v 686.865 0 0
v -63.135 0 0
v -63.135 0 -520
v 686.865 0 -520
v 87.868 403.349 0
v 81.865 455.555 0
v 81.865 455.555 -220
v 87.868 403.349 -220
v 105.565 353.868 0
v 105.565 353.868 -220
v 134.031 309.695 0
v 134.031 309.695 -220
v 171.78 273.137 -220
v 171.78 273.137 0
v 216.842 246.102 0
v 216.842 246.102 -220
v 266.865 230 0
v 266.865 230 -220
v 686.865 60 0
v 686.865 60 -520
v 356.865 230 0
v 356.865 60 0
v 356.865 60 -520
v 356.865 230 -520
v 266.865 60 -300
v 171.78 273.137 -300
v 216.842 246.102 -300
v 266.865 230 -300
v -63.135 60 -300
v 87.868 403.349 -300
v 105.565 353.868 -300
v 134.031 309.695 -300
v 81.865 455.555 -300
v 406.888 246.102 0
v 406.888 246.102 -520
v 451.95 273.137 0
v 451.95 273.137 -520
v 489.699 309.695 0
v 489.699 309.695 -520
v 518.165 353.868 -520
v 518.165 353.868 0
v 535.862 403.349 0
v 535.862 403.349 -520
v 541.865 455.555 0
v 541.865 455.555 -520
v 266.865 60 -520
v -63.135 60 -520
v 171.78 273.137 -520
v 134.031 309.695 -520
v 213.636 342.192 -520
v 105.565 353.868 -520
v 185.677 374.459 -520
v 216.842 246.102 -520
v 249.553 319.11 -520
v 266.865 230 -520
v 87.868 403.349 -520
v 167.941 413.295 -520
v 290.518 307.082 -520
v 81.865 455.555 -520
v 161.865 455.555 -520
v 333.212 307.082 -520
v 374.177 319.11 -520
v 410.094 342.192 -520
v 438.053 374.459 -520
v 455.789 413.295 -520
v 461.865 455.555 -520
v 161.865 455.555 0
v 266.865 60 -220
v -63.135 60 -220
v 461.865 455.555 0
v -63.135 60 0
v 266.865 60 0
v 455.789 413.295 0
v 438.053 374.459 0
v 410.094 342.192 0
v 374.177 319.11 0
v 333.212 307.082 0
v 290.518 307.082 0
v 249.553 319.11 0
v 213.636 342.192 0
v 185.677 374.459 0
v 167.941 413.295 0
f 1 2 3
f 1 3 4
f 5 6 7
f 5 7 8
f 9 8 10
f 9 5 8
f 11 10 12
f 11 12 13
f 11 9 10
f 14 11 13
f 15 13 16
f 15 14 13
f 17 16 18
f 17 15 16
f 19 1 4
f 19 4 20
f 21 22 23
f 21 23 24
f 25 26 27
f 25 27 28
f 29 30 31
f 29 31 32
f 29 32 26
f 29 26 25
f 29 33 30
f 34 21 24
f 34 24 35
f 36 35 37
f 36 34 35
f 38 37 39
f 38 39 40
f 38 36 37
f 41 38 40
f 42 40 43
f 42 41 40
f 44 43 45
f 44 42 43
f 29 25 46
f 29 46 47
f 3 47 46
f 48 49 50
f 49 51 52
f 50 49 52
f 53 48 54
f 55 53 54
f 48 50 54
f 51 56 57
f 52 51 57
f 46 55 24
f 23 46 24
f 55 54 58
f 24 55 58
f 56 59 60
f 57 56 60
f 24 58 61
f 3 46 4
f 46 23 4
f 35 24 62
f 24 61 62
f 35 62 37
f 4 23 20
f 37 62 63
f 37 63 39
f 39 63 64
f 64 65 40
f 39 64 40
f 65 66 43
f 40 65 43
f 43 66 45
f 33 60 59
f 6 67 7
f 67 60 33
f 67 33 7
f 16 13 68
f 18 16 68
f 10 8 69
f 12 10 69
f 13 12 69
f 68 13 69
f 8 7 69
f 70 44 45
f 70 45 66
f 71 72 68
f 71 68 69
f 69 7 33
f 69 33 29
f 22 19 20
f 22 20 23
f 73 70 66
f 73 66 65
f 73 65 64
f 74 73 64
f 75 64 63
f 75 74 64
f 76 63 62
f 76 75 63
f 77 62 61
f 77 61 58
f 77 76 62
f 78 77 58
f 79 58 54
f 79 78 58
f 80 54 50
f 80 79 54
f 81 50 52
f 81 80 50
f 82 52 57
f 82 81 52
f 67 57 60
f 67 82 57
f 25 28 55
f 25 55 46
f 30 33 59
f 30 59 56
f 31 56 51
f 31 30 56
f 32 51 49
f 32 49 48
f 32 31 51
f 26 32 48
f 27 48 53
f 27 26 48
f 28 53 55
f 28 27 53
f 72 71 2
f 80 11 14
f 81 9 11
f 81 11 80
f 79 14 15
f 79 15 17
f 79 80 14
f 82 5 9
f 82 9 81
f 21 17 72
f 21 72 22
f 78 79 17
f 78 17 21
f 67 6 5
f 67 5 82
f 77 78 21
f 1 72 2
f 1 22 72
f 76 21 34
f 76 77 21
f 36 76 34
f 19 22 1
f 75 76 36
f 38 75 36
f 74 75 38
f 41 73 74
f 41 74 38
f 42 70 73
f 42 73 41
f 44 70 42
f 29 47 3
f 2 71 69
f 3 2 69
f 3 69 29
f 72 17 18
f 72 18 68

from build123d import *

# Parameters (mm, degrees)
BOSS_EXTRUDE1_DEPTH = 520
RIB15_REACH         = 866.242
SKETCH14_WALL_W     = 2151.777513516
SKETCH14_WALL_H     = 80


with BuildPart() as part:
    # Sketch1 → Boss-Extrude1 (new body)
    with BuildSketch(Plane.XY):
        with BuildLine():
            Line((-63.134983493, 0), (686.865016507, 0))
            Line((686.865016507, 0), (686.865016507, 60))
            Line((686.865016507, 60), (356.865016507, 60))
            Line((356.865016507, 60), (356.865016507, 230))
            ThreePointArc((356.865016507, 230), (489.699208945, 309.695349915), (541.865016507, 455.554871373))
            Line((541.865016507, 455.554871373), (461.865016507, 455.554871373))
            ThreePointArc((461.865016507, 455.554871373), (311.865016507, 305.554871373), (161.865016507, 455.554871373))
            Line((161.865016507, 455.554871373), (81.865016507, 455.554871373))
            ThreePointArc((81.865016507, 455.554871373), (134.03082407, 309.695349915), (266.865016507, 230))
            Line((266.865016507, 230), (266.865016507, 60))
            Line((266.865016507, 60), (-63.134983493, 60))
            Line((-63.134983493, 60), (-63.134983493, 0))
        make_face()
    extrude(amount=-BOSS_EXTRUDE1_DEPTH)

    # Sketch14 wall → Rib15 (add, up to next)
    with BuildSketch(Plane(origin=(9.365016507, 257.777435686, -260), x_dir=(-0.344177678967, -0.938904534711, 0), z_dir=(-0.938904534711, 0.344177678967, 0)), mode=Mode.PRIVATE) as rib15_sk1:
        Rectangle(SKETCH14_WALL_W, SKETCH14_WALL_H)
    rib15_tool1 = extrude(rib15_sk1.sketch, amount=-RIB15_REACH, mode=Mode.PRIVATE) - part.part
    add(rib15_tool1.solids().sort_by_distance((9.365016507, 257.777435686, -260))[0])


solid = part.part
